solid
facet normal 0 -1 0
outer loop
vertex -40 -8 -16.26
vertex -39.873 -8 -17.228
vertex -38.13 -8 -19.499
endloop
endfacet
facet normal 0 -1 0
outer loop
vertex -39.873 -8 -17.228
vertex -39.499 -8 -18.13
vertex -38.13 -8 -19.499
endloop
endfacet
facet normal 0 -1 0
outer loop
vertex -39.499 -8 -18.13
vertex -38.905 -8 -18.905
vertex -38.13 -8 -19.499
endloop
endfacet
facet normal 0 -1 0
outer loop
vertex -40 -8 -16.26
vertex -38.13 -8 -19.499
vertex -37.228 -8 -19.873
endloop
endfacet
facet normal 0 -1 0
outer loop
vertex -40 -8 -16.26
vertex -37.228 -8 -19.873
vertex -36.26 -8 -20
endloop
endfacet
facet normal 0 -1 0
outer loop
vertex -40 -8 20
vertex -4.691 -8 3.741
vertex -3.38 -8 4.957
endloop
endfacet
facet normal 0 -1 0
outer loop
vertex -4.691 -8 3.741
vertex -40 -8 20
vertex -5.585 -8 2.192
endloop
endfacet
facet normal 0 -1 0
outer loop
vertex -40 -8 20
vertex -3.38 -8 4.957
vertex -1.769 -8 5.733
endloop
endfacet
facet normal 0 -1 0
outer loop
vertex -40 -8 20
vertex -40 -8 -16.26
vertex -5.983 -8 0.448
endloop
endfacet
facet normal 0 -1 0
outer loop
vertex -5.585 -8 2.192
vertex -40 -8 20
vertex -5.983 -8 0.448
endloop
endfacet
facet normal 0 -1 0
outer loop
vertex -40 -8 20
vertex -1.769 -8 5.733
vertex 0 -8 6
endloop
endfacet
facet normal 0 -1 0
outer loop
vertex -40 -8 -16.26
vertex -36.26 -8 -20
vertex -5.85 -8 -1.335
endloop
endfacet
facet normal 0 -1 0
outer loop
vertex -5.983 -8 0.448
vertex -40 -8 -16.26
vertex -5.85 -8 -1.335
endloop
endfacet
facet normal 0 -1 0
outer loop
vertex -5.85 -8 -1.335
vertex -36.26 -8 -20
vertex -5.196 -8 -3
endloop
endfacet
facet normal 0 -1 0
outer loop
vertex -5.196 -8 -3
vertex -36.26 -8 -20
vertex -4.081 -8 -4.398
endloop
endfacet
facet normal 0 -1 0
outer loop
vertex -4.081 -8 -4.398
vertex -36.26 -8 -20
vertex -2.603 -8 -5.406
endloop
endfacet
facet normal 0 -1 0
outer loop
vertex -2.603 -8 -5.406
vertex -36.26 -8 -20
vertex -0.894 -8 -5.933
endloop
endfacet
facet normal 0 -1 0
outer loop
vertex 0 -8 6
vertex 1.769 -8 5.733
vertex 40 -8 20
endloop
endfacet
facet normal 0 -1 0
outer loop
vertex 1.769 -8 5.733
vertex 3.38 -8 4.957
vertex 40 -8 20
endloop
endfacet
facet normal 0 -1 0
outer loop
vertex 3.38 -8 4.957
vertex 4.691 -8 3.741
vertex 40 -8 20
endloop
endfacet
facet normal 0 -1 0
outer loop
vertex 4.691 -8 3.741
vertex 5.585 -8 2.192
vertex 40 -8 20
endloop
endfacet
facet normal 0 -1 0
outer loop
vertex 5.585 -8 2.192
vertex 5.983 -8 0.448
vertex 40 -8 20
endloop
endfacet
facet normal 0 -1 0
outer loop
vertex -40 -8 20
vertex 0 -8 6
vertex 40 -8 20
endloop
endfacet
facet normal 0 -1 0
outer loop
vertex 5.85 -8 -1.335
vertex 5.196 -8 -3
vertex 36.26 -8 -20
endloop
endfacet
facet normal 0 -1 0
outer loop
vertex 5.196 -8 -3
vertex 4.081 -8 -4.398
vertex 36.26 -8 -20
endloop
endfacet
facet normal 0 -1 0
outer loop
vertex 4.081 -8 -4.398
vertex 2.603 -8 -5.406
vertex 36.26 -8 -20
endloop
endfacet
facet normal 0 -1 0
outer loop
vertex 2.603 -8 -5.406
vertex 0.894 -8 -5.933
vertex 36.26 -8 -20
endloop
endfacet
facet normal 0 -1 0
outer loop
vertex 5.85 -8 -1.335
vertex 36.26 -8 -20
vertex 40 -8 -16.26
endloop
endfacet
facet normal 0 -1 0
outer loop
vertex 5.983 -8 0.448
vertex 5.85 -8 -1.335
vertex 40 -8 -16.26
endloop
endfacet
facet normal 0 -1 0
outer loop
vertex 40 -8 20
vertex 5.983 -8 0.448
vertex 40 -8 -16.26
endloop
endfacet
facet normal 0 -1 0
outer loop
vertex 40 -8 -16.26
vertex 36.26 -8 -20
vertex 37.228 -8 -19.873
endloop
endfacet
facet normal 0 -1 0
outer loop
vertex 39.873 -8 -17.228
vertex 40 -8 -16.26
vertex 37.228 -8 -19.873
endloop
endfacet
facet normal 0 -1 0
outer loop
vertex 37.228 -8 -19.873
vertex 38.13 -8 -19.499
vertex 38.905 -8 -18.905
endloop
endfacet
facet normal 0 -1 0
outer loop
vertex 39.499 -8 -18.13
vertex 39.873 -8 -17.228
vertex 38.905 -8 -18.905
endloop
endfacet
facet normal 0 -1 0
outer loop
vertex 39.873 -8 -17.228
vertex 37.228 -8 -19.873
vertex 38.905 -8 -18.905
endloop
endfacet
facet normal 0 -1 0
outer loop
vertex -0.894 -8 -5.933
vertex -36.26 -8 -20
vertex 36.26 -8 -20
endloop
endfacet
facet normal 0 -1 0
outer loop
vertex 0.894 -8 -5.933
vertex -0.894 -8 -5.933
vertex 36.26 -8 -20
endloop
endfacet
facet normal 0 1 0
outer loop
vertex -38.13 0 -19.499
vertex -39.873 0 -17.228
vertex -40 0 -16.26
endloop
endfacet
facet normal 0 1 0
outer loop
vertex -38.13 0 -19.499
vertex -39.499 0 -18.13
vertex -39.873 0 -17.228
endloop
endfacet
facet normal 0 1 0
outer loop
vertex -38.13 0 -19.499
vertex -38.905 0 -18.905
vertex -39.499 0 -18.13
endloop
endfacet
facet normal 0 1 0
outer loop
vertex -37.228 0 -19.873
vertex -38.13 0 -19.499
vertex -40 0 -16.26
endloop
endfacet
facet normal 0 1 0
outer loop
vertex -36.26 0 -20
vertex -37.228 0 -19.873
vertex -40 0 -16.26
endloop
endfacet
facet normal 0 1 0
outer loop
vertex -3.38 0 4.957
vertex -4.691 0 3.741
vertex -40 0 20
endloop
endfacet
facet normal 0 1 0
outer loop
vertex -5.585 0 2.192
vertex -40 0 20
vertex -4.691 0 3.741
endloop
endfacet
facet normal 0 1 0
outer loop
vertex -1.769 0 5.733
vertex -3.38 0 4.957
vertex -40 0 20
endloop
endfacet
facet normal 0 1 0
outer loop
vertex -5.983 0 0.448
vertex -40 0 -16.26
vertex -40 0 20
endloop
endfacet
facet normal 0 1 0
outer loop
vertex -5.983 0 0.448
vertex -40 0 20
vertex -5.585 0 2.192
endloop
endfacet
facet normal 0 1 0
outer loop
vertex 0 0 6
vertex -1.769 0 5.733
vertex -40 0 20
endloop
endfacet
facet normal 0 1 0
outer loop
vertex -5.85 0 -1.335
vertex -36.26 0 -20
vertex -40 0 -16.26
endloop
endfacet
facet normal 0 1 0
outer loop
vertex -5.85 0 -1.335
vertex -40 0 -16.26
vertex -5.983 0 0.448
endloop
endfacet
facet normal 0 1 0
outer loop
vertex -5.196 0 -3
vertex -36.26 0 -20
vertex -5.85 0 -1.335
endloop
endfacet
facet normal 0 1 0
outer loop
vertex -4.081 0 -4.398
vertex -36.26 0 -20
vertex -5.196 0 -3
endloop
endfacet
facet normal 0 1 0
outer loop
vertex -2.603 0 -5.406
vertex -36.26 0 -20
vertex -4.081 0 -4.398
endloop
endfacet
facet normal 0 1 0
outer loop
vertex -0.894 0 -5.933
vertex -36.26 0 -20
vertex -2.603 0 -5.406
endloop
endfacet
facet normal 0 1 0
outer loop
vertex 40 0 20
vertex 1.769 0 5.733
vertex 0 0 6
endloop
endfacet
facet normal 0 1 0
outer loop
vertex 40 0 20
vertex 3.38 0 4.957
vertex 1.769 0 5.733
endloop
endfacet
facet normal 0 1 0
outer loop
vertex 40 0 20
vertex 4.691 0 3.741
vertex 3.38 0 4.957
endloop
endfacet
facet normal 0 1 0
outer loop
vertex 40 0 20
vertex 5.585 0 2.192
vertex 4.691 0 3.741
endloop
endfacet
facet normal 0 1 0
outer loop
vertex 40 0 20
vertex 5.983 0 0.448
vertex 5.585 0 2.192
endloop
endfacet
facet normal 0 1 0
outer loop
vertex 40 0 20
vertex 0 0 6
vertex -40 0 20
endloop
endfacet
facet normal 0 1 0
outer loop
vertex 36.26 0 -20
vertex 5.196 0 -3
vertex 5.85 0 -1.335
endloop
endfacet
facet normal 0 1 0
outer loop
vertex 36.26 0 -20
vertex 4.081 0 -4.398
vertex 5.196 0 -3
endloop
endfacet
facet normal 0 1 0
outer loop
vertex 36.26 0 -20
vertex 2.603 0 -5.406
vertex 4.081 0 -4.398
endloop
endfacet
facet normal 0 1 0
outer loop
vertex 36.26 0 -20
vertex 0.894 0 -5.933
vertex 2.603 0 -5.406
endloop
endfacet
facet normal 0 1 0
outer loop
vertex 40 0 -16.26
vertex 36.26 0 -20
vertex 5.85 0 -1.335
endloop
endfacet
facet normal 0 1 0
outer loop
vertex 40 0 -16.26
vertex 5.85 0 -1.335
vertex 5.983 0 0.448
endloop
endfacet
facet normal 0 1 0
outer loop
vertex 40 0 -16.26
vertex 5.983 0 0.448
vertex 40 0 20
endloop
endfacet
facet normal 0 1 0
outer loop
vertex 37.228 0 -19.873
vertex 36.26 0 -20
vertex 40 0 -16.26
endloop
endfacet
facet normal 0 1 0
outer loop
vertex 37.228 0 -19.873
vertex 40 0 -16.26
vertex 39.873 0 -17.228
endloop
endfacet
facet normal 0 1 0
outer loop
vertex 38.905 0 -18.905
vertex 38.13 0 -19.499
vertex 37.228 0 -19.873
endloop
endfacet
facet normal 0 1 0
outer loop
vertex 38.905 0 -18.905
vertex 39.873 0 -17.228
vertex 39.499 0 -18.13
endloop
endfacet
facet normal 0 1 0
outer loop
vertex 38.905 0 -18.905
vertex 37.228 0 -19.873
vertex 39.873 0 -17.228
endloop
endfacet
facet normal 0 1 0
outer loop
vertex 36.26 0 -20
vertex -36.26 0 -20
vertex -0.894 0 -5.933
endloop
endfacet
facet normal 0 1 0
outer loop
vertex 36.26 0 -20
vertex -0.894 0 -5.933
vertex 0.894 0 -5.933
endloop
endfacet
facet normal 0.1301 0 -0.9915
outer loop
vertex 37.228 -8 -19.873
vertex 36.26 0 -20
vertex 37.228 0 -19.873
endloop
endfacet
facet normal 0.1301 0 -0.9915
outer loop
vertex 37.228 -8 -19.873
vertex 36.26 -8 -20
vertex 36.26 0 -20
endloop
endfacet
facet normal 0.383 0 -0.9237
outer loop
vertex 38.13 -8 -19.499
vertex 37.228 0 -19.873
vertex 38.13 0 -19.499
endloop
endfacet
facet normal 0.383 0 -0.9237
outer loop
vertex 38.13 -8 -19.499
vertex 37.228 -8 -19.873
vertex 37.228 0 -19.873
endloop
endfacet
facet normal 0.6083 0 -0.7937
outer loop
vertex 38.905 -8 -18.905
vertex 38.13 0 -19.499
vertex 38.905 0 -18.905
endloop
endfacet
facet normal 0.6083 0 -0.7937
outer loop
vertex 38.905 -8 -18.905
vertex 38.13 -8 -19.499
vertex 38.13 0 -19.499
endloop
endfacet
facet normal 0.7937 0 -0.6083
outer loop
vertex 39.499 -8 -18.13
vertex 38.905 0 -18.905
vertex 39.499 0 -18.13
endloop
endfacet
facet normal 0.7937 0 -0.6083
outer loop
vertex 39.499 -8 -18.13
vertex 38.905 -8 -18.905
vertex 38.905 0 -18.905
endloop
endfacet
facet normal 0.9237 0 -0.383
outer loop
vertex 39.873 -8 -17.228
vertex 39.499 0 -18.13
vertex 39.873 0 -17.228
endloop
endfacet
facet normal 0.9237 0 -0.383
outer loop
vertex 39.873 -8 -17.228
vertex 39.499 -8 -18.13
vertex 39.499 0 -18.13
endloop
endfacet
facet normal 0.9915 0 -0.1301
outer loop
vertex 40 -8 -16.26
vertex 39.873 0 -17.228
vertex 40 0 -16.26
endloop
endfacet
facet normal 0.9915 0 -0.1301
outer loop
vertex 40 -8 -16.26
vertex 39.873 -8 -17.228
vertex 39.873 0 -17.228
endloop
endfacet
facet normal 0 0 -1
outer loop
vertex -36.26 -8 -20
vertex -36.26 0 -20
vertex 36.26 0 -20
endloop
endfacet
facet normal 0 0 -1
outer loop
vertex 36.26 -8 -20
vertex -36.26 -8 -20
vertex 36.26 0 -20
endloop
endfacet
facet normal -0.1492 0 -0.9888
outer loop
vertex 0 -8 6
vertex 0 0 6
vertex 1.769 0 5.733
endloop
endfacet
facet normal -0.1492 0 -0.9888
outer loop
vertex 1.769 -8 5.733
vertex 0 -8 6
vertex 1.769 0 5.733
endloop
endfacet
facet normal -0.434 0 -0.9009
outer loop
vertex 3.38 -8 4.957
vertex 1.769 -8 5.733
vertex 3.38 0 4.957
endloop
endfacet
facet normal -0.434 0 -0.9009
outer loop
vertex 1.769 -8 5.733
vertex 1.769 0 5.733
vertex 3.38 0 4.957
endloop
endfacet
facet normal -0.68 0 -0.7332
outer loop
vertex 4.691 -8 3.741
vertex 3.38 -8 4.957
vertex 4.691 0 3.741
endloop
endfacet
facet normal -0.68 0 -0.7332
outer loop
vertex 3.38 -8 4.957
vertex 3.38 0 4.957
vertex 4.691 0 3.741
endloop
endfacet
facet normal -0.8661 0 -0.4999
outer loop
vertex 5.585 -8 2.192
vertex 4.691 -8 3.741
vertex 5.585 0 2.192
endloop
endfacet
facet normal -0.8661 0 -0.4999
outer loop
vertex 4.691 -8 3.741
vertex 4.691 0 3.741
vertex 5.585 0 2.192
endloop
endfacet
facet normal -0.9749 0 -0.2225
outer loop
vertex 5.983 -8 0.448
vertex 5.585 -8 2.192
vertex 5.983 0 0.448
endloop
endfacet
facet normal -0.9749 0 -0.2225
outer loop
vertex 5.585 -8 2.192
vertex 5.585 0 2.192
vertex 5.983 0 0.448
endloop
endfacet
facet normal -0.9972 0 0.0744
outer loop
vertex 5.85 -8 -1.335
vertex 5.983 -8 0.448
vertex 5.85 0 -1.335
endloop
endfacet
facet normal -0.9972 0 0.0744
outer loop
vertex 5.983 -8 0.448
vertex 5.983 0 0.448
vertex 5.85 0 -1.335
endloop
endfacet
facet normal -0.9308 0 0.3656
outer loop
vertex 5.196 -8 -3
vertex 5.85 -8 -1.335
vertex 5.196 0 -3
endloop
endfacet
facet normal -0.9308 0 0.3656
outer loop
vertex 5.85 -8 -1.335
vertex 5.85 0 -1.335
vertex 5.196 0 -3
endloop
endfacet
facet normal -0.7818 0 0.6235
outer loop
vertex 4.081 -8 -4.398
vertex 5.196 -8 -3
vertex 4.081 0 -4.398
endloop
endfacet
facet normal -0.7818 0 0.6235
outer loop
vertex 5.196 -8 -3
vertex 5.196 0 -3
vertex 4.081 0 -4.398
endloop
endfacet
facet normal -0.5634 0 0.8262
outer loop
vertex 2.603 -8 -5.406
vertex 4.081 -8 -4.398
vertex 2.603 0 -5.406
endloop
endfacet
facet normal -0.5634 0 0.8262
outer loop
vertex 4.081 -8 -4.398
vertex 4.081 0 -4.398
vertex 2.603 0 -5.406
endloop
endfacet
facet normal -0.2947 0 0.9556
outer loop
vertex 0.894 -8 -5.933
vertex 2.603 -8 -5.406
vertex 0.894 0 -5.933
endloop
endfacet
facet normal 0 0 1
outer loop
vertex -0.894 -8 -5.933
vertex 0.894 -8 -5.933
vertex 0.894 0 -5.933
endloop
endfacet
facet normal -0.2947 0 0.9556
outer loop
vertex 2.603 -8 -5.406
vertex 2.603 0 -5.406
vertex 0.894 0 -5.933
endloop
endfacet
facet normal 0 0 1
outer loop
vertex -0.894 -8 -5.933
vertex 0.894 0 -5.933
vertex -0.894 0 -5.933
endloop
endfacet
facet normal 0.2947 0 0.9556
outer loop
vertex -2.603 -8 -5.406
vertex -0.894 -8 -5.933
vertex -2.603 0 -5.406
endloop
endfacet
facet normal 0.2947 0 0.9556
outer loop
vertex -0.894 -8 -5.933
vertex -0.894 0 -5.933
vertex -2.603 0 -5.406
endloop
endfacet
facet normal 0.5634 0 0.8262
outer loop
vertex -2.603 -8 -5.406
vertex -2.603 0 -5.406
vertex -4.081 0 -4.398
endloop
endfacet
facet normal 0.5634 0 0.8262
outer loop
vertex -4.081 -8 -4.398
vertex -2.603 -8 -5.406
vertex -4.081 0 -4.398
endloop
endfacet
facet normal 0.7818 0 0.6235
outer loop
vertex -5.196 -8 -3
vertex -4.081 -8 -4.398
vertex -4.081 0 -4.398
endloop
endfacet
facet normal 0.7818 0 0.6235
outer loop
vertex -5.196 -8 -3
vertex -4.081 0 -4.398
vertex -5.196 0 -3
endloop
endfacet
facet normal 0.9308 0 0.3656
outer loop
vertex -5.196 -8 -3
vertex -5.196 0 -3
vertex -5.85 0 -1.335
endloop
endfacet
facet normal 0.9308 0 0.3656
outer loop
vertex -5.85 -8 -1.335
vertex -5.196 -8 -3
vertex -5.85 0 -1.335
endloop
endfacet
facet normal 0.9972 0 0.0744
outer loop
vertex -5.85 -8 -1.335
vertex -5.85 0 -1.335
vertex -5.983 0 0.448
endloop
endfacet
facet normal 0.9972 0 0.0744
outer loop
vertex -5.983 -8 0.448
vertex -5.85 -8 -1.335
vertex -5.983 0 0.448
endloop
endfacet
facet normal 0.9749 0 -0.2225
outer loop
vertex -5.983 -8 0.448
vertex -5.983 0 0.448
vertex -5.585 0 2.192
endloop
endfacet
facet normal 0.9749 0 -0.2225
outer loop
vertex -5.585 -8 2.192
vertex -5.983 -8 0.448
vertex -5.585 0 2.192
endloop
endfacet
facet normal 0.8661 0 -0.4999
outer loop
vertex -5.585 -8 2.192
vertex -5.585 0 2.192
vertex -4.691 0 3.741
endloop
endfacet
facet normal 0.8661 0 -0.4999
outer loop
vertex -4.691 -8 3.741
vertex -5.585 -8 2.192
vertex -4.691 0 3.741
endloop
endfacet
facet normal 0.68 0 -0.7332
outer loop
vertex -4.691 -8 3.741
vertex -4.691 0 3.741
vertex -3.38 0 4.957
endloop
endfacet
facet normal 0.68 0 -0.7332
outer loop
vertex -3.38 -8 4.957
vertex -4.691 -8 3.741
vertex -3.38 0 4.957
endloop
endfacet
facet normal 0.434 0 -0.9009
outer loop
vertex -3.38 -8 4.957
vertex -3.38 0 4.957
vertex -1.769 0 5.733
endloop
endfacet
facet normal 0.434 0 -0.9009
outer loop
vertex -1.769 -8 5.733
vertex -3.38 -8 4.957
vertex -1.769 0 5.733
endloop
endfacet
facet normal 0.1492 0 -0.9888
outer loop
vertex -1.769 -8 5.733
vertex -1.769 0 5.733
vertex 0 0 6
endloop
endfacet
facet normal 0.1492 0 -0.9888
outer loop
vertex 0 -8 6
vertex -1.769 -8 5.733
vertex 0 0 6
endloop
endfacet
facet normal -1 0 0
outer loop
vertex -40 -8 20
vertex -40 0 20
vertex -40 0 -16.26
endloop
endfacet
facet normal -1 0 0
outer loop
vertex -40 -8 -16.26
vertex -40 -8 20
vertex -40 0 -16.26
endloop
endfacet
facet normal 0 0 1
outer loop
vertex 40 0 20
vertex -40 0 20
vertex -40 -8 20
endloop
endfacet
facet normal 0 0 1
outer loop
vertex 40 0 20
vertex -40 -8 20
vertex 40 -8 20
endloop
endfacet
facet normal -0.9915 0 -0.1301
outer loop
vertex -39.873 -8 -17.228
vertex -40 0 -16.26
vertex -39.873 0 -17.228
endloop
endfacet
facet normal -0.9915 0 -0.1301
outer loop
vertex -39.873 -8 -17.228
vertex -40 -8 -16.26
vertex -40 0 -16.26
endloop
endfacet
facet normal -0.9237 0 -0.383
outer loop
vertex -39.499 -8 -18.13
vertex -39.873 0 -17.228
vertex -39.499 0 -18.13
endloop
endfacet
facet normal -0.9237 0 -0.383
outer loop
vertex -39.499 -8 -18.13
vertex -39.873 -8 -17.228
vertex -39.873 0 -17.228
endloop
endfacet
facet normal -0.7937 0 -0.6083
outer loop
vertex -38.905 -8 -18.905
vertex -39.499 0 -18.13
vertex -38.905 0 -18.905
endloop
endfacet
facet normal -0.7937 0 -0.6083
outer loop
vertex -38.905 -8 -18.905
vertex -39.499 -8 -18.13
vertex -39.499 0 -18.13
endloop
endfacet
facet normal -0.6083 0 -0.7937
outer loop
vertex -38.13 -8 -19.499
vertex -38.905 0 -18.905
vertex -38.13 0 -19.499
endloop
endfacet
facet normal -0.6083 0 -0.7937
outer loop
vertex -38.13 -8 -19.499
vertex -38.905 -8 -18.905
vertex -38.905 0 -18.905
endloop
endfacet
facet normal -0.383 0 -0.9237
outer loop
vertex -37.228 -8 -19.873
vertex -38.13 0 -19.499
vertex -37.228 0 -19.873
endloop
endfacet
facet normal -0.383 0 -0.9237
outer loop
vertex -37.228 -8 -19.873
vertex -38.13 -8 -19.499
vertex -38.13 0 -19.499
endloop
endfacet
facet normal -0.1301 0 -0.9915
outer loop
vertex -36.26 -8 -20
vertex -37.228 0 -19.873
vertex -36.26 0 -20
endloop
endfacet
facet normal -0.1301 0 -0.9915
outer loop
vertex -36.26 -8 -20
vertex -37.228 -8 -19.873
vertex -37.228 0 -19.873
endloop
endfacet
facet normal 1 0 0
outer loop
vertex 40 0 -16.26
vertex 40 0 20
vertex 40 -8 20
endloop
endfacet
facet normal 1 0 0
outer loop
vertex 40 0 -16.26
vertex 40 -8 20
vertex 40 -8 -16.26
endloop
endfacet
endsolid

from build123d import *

# Parameters (mm, degrees)
SKETCH1_W          = 80
SKETCH1_H          = 40
BASE_FLANGE1_DEPTH = 8
SKETCH6_R          = 6
CUT_EXTRUDE1_DEPTH = 10
FILLET1_R          = 3.74


# Sheet-metal steps are written as plain solids
with BuildPart() as part:
    # Sketch1 → Base-Flange1 (new body)
    with BuildSketch(Plane(origin=(0, 0, 0), x_dir=(1, 0, 0), z_dir=(0, 1, 0))):
        Rectangle(SKETCH1_W, SKETCH1_H)
    extrude(amount=-BASE_FLANGE1_DEPTH)

    # Sketch6 → Cut-Extrude1 (cut)
    with BuildSketch(Plane(origin=(0, 0, 0), x_dir=(1, 0, 0), z_dir=(0, 1, 0))):
        with Locations(Location((0, 0, 0), (0, 0, 270))):
            Circle(SKETCH6_R)
    extrude(amount=-CUT_EXTRUDE1_DEPTH, mode=Mode.SUBTRACT)

    # Fillet1
    fillet1_edges = [part.edges().sort_by_distance(p)[0] for p in [
        (-40, -4, -20),
        (40, -4, -20),
    ]]
    fillet(fillet1_edges, radius=FILLET1_R)


solid = part.part
